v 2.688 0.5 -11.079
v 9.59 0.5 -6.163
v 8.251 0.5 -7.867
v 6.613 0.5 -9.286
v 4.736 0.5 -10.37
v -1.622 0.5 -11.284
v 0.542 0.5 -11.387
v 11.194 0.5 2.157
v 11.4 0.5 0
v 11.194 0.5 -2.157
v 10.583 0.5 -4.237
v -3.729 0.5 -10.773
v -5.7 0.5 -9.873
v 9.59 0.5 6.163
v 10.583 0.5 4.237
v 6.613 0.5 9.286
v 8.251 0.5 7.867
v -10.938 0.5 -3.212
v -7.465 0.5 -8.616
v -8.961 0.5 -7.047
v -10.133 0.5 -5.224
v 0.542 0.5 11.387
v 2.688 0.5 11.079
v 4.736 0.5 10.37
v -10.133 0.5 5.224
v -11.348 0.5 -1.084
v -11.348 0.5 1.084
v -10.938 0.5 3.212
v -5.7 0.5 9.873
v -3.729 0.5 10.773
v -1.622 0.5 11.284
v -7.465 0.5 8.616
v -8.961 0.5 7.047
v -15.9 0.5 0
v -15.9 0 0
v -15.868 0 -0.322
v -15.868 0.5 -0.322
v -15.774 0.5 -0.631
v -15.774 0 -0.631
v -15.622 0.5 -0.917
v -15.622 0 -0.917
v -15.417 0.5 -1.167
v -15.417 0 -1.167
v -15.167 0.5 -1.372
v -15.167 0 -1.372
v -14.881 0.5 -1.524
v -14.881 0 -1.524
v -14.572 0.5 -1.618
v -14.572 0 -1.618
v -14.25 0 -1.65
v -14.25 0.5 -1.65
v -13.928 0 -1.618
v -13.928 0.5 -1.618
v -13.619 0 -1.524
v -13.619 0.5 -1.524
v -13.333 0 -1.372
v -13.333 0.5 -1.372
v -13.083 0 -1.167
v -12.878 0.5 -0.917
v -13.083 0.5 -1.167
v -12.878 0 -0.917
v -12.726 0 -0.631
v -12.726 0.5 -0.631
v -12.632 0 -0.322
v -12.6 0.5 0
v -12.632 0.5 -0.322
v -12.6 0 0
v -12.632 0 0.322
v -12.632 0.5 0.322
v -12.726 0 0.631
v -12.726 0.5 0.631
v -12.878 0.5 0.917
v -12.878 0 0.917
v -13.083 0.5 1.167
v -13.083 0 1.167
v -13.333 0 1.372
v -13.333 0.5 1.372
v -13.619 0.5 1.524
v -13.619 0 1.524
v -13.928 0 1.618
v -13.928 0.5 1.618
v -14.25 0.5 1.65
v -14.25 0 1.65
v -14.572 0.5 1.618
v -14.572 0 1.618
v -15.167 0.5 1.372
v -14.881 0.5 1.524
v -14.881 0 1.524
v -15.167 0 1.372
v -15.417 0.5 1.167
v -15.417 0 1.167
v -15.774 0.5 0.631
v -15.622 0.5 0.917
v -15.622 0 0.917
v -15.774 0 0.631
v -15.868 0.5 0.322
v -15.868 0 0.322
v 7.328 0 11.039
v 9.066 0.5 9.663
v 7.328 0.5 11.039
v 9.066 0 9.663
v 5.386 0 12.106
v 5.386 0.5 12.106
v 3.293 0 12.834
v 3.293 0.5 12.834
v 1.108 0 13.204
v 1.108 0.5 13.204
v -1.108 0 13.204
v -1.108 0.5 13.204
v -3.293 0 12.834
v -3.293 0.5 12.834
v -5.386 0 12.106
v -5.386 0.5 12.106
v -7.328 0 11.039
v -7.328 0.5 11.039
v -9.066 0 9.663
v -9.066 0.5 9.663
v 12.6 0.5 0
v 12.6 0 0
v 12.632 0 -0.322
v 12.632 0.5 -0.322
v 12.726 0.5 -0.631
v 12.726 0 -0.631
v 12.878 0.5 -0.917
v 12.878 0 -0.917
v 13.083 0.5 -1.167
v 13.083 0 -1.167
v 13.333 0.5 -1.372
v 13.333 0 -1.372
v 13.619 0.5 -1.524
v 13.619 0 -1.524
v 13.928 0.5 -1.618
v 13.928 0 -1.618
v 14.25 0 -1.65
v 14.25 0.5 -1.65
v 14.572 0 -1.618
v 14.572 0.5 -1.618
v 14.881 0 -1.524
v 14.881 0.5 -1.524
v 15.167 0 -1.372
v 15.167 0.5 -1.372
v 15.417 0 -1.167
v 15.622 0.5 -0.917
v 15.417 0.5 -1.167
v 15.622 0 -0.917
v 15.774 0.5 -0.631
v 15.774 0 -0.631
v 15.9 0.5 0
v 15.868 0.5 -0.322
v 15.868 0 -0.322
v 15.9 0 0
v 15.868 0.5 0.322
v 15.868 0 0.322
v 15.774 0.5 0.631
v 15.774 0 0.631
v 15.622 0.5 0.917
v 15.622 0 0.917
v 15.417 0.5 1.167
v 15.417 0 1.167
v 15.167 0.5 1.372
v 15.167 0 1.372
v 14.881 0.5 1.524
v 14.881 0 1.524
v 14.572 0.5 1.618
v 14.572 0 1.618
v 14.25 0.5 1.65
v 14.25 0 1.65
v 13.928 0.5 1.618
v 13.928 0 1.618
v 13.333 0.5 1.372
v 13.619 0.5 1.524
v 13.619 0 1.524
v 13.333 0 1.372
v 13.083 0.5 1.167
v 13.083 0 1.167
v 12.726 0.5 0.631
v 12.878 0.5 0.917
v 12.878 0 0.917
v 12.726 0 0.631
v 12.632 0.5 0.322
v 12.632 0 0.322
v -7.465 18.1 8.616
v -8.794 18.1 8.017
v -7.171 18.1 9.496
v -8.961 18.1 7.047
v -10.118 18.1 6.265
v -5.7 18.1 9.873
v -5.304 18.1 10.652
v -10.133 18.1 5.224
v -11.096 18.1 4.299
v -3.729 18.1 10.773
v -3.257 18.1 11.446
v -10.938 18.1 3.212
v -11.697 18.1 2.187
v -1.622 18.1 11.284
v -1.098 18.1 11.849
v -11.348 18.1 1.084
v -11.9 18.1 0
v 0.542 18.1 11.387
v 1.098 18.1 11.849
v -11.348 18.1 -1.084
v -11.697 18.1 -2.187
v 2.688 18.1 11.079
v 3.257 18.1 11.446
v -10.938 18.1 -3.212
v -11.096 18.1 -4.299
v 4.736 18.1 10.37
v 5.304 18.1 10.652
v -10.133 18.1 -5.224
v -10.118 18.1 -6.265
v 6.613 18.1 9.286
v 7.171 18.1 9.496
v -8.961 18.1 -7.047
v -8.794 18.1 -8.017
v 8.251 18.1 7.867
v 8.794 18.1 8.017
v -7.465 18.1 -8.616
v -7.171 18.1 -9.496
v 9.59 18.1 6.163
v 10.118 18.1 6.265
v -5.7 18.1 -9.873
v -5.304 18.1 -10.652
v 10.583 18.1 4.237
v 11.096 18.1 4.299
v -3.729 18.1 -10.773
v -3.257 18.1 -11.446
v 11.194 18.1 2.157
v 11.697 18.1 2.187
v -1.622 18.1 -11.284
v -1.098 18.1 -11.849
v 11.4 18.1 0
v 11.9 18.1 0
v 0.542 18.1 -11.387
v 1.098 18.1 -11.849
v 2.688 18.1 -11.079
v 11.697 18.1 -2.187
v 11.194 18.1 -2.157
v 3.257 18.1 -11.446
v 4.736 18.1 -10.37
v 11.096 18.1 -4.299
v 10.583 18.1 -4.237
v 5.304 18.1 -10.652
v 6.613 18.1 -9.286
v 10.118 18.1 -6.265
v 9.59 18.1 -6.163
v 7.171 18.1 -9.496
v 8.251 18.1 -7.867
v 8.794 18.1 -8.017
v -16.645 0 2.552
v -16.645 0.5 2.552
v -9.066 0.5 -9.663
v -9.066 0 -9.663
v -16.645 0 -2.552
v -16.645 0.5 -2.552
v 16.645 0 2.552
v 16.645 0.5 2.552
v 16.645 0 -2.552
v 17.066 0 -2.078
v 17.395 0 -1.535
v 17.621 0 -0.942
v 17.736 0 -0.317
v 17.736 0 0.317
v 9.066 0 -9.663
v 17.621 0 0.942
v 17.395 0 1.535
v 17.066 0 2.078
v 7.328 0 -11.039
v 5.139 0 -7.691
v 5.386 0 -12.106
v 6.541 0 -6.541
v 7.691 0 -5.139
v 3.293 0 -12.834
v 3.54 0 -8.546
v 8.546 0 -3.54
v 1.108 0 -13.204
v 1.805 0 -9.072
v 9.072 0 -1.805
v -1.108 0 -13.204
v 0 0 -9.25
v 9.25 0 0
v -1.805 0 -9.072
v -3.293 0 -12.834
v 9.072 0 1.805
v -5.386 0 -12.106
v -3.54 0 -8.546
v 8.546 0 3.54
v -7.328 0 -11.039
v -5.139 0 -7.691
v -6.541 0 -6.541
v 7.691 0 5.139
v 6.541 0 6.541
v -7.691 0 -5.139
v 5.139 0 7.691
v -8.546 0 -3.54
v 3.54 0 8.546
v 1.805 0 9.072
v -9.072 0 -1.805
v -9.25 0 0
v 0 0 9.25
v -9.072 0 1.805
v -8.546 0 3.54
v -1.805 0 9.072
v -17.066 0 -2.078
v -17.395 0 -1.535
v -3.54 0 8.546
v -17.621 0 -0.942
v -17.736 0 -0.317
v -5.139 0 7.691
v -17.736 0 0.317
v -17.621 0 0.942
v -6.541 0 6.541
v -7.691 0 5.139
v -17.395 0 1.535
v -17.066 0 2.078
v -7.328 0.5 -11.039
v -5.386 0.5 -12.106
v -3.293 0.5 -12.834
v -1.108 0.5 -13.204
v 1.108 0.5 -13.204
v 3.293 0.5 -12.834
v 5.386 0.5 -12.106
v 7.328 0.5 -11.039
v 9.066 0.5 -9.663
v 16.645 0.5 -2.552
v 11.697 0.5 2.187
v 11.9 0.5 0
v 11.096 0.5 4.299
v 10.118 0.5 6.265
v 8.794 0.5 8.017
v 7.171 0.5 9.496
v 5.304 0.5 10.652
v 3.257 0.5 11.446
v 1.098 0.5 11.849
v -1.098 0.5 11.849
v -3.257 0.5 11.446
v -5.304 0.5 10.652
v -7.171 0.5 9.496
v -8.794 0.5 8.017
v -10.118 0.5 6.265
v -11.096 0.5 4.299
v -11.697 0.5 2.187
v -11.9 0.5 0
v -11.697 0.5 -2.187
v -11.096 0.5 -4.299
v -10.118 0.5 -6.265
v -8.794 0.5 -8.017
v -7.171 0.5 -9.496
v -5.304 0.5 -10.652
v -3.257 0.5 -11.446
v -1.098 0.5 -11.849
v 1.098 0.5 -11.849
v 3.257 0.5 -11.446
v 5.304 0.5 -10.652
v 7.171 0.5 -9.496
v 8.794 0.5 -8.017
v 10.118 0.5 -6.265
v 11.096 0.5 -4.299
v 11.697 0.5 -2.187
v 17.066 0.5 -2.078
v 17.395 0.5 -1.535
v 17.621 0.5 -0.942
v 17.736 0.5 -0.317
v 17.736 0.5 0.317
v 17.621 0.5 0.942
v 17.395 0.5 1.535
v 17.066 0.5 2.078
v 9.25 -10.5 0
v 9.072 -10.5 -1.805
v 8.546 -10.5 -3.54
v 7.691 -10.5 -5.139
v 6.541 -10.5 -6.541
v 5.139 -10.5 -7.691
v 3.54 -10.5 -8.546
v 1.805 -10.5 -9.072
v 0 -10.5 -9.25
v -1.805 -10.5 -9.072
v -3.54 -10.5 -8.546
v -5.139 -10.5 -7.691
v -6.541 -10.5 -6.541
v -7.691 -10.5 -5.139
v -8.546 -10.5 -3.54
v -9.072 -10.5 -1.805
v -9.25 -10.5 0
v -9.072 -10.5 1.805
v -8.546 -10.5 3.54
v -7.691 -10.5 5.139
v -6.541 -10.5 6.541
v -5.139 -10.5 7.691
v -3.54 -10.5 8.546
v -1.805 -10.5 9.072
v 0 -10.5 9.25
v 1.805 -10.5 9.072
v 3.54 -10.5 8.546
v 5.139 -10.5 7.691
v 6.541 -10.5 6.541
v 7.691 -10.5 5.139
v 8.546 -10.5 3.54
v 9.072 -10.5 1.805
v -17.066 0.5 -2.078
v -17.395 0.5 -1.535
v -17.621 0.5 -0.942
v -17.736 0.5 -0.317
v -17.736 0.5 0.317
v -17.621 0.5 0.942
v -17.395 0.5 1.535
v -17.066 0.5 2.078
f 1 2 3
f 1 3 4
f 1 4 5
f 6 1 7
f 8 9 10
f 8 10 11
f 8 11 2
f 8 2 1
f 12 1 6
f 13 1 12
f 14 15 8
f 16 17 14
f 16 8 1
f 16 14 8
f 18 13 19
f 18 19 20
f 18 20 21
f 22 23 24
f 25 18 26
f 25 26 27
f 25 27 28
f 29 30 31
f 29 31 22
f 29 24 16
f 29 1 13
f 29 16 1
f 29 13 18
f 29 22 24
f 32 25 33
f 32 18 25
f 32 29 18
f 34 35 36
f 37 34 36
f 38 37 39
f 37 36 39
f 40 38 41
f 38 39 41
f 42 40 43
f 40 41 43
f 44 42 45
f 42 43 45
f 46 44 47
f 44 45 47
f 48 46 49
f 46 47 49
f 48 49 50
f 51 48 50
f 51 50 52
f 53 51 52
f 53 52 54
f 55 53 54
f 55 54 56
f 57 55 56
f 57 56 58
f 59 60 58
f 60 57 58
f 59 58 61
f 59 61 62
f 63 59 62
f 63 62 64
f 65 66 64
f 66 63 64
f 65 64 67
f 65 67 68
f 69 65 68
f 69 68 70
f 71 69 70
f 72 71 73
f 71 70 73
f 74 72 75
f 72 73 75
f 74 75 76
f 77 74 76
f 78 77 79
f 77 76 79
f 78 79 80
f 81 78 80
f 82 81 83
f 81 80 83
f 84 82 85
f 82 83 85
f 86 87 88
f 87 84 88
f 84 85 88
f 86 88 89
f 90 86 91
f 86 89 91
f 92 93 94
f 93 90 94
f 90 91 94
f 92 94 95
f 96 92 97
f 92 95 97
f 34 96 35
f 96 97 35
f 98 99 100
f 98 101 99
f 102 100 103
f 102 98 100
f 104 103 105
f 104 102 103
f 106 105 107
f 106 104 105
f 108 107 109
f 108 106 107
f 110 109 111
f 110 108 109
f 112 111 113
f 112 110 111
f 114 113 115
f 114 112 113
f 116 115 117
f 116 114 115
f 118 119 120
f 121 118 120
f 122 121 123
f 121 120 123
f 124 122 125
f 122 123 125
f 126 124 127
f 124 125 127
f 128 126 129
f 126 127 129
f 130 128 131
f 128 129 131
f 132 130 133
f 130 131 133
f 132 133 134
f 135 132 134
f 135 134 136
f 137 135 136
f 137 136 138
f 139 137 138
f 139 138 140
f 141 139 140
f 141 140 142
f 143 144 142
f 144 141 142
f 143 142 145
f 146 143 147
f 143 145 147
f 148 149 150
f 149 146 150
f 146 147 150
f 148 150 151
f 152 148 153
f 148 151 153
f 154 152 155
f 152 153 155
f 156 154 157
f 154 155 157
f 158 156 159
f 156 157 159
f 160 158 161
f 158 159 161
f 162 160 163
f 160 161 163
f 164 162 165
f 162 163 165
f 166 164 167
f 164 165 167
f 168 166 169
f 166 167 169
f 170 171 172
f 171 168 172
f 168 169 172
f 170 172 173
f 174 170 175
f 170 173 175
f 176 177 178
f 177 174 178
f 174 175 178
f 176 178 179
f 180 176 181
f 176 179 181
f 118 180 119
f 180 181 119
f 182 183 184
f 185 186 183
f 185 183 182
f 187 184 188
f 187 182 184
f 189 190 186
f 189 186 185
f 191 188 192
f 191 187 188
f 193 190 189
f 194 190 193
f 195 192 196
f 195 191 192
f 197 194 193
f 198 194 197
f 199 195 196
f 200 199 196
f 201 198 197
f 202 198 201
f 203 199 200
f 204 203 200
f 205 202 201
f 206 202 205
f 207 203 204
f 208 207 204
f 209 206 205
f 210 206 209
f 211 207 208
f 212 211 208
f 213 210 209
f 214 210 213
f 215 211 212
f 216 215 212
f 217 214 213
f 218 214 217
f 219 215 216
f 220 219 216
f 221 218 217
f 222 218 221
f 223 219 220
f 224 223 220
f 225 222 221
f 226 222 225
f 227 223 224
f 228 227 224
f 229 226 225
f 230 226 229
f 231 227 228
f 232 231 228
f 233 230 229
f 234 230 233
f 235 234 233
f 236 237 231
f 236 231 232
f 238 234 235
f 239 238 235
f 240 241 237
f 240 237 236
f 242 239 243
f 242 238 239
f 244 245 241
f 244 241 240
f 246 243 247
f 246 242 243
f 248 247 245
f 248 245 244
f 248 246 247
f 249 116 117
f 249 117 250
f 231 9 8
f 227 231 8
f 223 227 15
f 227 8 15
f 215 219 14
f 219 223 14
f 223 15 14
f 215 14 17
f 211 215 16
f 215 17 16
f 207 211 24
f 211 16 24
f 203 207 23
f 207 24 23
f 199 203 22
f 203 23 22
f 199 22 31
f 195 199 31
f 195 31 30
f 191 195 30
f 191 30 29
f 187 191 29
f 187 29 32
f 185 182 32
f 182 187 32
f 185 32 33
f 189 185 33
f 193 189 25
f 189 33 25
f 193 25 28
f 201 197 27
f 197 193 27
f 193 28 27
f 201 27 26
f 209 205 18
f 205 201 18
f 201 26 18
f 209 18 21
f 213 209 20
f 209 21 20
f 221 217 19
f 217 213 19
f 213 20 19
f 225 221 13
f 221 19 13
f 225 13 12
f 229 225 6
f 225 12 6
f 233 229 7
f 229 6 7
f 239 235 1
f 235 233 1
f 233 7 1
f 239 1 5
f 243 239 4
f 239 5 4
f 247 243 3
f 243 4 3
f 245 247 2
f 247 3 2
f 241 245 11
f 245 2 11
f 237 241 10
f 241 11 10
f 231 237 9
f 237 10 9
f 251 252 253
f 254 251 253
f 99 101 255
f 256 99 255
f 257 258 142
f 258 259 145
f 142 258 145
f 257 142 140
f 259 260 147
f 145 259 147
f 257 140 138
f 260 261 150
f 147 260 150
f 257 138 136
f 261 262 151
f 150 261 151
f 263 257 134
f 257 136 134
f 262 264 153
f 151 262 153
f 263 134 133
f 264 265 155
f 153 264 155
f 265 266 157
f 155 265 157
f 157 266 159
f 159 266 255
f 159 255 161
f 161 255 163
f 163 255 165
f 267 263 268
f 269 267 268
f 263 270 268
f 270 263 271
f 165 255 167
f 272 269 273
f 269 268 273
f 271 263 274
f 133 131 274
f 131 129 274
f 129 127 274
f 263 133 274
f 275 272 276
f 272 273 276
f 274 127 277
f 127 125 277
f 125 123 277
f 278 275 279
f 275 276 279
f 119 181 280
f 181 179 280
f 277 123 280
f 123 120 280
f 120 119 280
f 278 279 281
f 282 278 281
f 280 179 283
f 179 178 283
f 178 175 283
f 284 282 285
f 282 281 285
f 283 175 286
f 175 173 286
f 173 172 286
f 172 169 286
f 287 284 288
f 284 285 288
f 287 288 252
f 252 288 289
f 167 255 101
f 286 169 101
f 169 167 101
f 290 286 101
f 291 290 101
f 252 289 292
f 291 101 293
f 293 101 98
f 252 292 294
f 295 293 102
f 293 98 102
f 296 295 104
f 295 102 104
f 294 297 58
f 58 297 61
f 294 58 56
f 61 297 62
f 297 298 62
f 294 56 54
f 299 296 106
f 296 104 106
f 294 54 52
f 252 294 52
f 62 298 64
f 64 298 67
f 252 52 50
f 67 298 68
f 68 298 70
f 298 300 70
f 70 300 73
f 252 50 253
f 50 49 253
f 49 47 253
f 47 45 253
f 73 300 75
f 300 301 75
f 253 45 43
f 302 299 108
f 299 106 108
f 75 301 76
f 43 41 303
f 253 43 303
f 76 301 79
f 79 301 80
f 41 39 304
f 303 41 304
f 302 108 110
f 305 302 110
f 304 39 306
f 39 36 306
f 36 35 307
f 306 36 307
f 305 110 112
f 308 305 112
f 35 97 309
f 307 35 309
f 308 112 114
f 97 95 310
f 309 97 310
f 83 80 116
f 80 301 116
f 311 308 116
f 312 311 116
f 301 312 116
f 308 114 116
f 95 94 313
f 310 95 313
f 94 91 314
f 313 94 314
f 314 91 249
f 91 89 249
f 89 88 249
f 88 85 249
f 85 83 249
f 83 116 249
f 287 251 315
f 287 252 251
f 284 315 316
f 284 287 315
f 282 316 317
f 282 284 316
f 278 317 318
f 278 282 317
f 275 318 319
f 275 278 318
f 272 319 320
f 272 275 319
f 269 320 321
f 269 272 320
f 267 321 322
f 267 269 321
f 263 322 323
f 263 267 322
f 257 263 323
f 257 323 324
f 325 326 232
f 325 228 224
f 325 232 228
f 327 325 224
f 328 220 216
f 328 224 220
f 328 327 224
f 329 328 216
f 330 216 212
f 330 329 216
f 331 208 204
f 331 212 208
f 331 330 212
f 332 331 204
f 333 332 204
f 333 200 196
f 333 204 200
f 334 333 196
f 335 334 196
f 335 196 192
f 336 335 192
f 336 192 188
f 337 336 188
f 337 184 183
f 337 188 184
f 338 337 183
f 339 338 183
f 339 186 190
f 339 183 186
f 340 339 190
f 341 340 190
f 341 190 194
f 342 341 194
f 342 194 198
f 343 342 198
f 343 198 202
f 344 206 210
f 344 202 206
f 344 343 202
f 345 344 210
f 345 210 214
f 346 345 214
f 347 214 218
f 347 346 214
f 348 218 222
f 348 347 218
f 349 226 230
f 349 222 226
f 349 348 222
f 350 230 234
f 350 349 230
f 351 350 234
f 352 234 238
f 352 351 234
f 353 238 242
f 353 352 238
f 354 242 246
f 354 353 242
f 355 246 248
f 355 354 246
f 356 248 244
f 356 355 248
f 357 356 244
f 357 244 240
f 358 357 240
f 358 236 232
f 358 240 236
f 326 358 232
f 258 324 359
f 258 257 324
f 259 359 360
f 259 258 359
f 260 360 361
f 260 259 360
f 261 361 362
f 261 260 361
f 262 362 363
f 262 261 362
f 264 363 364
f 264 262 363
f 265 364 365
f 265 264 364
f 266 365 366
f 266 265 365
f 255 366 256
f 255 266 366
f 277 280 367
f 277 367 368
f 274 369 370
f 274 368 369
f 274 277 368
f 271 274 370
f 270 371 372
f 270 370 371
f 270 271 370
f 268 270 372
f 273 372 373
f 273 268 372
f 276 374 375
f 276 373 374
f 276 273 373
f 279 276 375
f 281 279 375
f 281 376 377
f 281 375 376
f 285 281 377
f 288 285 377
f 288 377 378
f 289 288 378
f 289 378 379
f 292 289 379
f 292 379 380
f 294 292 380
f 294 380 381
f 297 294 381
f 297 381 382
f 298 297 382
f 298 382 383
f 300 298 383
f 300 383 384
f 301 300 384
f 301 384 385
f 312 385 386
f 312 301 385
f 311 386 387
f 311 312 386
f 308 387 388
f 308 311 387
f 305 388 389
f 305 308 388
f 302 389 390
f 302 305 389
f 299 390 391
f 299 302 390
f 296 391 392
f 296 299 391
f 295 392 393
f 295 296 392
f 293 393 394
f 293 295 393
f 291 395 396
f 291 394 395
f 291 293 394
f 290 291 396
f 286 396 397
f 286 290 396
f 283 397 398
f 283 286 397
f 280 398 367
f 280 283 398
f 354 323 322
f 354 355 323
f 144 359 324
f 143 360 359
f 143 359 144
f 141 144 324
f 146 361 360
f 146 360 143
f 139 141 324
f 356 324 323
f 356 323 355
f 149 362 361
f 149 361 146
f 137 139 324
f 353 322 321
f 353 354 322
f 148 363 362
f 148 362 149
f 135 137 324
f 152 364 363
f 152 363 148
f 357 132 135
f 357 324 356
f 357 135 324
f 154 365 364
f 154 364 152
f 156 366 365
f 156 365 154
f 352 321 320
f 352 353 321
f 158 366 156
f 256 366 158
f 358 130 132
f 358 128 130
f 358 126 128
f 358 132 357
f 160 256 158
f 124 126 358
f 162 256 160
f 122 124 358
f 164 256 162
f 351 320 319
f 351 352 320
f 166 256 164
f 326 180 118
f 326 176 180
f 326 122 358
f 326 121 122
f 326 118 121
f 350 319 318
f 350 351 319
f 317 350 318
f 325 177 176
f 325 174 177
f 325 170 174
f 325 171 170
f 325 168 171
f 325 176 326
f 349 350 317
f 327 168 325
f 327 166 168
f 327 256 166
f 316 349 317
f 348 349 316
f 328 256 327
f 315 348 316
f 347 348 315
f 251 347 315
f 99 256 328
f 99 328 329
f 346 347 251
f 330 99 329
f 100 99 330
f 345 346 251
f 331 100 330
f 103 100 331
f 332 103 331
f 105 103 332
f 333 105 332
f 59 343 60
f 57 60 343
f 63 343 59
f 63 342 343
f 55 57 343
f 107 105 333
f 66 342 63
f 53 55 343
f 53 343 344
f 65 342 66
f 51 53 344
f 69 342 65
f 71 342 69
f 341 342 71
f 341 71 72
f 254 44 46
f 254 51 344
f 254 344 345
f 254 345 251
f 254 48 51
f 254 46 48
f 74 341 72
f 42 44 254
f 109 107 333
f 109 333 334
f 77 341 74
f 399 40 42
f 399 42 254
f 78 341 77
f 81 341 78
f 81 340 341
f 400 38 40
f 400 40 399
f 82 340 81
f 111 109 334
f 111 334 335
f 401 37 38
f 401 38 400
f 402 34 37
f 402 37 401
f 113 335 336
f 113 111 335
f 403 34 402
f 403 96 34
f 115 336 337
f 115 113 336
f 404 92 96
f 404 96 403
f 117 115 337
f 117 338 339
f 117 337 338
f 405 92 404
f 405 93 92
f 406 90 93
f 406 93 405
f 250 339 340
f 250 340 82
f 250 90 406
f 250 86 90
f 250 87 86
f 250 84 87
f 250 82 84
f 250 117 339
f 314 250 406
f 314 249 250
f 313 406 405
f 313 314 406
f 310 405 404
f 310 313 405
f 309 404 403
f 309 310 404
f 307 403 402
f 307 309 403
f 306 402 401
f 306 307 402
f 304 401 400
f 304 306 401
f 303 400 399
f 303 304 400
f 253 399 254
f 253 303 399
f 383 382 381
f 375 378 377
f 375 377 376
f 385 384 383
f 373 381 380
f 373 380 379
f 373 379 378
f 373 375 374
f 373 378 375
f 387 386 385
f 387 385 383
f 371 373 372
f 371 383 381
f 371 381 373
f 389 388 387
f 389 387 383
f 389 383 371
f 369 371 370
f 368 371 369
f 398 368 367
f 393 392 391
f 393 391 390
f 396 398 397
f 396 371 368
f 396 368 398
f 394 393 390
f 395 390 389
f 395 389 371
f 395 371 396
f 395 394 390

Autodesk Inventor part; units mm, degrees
ref_plane "YZ Plane" through (0, 0, 0) normal (1, 0, 0) x (0, 1, 0)
ref_plane "XZ Plane" through (0, 0, 0) normal (0, 1, 0) x (-1, 0, 0)
ref_plane "XY Plane" through (0, 0, 0) normal (0, 0, 1) x (1, 0, 0)
sketch "Sketch1" plane through (0, 0, 0) normal (0, 1, 0) x (-1, 0, 0)
  line L0 (0, 0) -> (14.25, 0) construction
  circle A0 centre (14.25, 0) radius 1.65
  line L1 (0, 0) -> (17.75, 0) construction
  line L2 (17.75, 0) -> (17.75, -0.5019) construction
  line L3 (9.0658, 9.663) -> (16.6447, 2.5525)
  line L4 (9.0658, -9.663) -> (16.6447, -2.5525)
  arc A1 (16.6447, -2.5525) -> (16.6447, 2.5525) centre (14.25, 0) ccw
  line L5 (0, 0) -> (0, -5) construction
  circle A2 centre (-14.25, 0) radius 1.65
  line L6 (-9.0658, 9.663) -> (-16.6447, 2.5525)
  line L7 (-9.0658, -9.663) -> (-16.6447, -2.5525)
  arc A3 (-16.6447, 2.5525) -> (-16.6447, -2.5525) centre (-14.25, 0) ccw
  arc A4 (9.0658, 9.663) -> (-9.0658, 9.663) centre (0, 0) ccw
  arc A5 (-9.0658, -9.663) -> (9.0658, -9.663) centre (0, 0) ccw
  dimension "d1" = 14.25
  dimension "d2" = 3.3
  dimension "d3" = 17.75
  dimension "d7" = 13.25
  dimension "d8" = 5
extrude "Extrusion1" add sketch "Sketch1" along normal blind 0.5
sketch "Sketch2" plane through (0, 0.5, 0) normal (0, 1, 0) x (1, 0, 0)
  circle A0 centre (0, 0) radius 11.9
  circle A1 centre (0, 0) radius 11.4
  dimension "d11" = 23.8
  dimension "d12" = 22.8
extrude "Extrusion2" add sketch "Sketch2" along normal blind 17.6
sketch "Sketch3" plane through (0, 0, 0) normal (0, -1, 0) x (1, 0, 0)
  circle A0 centre (0, 0) radius 9.25
  dimension "d15" = 18.5
extrude "Extrusion3" add sketch "Sketch3" along normal blind 10.5
properties part number "tube socket 9 pin"
